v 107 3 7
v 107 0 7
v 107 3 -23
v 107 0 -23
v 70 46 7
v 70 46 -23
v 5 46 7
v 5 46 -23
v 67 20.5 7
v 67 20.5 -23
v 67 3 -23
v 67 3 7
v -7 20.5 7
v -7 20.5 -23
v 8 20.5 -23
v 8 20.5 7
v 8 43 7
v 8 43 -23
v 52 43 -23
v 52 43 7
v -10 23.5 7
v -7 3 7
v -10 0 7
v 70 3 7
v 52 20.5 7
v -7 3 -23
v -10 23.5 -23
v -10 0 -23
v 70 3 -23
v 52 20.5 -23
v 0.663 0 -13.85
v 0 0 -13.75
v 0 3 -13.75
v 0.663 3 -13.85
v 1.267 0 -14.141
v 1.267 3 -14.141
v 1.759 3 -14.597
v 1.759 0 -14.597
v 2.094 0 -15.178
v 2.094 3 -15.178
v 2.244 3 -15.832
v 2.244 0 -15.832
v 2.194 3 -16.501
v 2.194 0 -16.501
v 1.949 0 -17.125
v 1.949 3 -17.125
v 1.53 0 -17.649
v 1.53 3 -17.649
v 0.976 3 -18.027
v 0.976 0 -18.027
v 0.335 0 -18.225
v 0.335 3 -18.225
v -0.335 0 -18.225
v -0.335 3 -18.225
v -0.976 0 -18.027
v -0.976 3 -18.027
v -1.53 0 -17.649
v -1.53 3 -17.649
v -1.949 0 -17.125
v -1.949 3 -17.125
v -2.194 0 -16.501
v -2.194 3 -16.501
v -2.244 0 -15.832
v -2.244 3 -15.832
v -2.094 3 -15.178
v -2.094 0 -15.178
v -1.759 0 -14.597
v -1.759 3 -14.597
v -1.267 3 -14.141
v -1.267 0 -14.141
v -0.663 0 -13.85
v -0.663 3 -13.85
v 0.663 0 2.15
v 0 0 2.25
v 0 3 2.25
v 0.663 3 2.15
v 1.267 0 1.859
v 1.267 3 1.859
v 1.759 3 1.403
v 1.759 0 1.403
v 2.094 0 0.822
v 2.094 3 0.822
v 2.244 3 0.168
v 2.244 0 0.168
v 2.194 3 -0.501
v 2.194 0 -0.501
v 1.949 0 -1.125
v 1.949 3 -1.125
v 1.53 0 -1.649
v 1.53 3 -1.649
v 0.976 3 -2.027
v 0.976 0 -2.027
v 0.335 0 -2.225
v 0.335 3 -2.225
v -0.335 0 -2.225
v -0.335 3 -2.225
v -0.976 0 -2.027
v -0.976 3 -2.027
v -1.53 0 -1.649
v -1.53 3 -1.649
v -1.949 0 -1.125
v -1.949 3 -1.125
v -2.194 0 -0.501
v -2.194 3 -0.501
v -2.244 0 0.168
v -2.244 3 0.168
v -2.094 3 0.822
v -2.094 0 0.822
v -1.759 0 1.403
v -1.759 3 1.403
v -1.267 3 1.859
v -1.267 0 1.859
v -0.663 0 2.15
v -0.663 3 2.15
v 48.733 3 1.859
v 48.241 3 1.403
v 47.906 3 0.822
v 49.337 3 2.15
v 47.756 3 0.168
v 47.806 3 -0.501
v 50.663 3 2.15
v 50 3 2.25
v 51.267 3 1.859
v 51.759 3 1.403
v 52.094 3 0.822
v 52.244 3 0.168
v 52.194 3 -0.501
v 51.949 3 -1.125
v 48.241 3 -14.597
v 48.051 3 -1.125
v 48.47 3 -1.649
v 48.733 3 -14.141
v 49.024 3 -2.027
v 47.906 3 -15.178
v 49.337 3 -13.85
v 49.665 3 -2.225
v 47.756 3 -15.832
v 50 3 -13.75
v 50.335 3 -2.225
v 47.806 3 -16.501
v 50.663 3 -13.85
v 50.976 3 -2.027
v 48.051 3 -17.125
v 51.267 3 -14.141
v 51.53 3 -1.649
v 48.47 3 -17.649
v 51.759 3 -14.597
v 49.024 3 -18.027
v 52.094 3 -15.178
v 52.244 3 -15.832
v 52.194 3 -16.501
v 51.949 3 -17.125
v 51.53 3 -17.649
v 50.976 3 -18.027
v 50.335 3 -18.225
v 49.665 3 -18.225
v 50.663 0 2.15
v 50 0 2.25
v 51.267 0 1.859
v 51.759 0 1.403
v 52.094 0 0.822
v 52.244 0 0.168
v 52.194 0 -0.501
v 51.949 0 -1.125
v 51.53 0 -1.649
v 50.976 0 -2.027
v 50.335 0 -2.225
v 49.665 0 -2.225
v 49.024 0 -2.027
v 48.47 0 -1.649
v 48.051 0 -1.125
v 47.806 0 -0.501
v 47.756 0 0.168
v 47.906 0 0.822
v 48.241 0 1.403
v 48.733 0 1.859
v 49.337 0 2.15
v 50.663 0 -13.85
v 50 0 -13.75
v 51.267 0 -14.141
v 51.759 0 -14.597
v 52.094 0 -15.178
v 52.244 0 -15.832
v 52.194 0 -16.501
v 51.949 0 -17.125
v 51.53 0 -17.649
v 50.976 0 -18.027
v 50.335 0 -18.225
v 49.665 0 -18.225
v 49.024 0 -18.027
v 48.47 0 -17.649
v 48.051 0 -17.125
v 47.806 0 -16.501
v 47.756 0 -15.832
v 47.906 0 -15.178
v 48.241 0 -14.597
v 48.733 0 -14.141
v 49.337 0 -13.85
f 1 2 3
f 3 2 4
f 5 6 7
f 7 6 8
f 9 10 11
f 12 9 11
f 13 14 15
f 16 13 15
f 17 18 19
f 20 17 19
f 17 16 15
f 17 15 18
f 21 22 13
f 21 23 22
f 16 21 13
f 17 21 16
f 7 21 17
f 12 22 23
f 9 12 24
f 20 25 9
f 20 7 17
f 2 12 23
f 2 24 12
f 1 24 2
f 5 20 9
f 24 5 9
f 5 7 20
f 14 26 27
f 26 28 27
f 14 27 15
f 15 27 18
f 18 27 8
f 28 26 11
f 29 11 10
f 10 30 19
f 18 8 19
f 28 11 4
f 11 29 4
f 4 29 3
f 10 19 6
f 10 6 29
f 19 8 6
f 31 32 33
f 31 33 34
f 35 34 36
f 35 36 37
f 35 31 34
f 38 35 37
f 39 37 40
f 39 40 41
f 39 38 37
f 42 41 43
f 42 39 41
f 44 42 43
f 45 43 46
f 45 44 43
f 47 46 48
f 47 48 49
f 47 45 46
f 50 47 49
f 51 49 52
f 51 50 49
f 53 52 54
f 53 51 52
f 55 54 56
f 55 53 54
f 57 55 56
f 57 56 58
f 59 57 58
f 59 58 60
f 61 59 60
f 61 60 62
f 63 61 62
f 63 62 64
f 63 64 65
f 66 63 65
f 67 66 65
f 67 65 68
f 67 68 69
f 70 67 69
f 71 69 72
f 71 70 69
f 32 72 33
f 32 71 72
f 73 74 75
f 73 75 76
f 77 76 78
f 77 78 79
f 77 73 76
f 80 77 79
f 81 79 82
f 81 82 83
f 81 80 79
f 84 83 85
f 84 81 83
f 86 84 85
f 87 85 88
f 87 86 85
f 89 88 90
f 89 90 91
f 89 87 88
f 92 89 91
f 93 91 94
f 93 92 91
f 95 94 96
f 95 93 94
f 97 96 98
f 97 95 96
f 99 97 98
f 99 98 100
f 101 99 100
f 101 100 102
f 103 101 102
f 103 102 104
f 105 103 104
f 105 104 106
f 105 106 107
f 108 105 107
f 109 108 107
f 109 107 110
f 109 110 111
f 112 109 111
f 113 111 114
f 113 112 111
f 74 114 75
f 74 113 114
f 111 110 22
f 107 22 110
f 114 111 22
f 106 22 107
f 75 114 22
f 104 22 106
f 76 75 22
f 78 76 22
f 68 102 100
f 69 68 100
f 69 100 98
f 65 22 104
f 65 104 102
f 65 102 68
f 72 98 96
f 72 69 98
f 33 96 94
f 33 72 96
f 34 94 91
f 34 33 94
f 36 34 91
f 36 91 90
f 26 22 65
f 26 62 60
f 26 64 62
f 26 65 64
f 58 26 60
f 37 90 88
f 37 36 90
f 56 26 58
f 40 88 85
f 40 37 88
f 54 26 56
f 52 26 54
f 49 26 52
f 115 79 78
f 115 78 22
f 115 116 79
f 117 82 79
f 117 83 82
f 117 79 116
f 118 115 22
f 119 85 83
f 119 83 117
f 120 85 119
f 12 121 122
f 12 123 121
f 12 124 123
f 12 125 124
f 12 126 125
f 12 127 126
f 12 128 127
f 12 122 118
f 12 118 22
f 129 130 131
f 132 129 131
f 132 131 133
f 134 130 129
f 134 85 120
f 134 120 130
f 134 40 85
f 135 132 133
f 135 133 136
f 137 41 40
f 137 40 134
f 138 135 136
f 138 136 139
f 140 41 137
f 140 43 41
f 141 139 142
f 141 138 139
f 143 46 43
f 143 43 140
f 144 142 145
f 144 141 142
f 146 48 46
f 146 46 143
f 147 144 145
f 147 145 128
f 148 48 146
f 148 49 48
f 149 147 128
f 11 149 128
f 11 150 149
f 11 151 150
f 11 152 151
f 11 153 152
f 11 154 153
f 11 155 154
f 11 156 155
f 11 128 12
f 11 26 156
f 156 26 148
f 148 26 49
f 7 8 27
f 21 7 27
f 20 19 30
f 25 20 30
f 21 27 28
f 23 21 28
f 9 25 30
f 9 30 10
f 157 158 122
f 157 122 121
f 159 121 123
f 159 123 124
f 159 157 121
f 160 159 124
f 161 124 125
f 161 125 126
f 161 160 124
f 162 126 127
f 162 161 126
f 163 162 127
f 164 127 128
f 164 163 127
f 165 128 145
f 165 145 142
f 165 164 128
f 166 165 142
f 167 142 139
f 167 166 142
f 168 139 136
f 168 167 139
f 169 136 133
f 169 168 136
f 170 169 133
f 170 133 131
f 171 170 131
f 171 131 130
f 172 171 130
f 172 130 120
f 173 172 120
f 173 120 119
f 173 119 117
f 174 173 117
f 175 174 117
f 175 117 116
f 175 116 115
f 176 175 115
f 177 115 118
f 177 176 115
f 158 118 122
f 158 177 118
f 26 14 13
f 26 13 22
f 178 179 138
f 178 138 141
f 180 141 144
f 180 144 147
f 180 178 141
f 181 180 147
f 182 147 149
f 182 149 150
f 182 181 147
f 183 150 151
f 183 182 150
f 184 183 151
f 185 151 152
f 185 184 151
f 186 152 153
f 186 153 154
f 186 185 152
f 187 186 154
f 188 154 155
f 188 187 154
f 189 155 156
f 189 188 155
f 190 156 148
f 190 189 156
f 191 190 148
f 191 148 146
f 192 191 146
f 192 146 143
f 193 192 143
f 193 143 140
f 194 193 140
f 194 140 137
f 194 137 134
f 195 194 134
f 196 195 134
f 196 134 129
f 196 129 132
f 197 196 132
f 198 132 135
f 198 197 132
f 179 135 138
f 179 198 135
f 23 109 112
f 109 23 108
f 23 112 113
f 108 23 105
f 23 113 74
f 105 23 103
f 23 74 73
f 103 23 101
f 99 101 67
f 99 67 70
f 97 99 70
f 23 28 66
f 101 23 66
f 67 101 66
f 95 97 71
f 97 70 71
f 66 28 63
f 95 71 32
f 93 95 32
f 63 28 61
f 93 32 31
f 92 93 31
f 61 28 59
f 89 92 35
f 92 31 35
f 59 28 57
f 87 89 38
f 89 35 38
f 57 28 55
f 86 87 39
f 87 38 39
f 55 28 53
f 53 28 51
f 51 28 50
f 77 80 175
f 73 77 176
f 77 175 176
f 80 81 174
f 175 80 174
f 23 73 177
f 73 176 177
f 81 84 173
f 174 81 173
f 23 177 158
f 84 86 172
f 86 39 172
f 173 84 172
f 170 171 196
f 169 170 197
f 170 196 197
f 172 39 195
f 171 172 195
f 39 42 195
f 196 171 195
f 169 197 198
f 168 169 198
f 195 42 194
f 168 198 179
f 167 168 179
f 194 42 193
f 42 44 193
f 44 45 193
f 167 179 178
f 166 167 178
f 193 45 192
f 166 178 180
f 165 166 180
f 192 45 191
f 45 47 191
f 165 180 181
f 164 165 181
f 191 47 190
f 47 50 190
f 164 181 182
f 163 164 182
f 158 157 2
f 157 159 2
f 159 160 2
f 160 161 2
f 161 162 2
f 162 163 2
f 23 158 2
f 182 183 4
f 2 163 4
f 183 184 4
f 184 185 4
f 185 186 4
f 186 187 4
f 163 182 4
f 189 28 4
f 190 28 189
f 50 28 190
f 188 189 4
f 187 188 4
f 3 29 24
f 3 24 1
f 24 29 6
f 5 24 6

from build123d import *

# Parameters (mm, degrees)
SKETCH1_R           = 2.25
BOSS_EXTRUDE1_DEPTH = 3
BOSS_EXTRUDE2_DEPTH = 30
BOSS_EXTRUDE3_DEPTH = 30


with BuildPart() as part:
    # Sketch1 → Boss-Extrude1 (new body)
    with BuildSketch(Plane(origin=(0, 0, 0), x_dir=(1, 0, 0), z_dir=(0, 1, 0))):
        Polygon((-7, 23), (-7, -7), (57, -7), (107, -7), (107, 23), (57, 23), align=None)
        with Locations(Location((0, 0, 0), (0, 0, 270))):
            Circle(SKETCH1_R, mode=Mode.SUBTRACT)
        with Locations(Location((0, 16, 0), (0, 0, 270))):
            Circle(SKETCH1_R, mode=Mode.SUBTRACT)
        with Locations(Location((50, 0, 0), (0, 0, 270))):
            Circle(SKETCH1_R, mode=Mode.SUBTRACT)
        with Locations(Location((50, 16, 0), (0, 0, 270))):
            Circle(SKETCH1_R, mode=Mode.SUBTRACT)
    extrude(amount=BOSS_EXTRUDE1_DEPTH)

    # Sketch2 → Boss-Extrude2 (add)
    with BuildSketch(Plane(origin=(0, 0, -23), x_dir=(-1, 0, 0), z_dir=(0, 0, -1))):
        Polygon((7, 3), (7, 20.5), (-7.999999932, 20.5), (-7.999999932, 43.000000035), (-51.999999932, 43.000000035), (-51.999999932, 20.5), (-66.999999864, 20.5), (-66.999999864, 3), (-69.999999864, 3), (-69.999999864, 46.000000035), (-4.999999932, 46.000000035), (-4.999999932, 23.5), (10, 23.5), (10, 0), (7, 0), align=None)
    extrude(amount=-BOSS_EXTRUDE2_DEPTH)

    # Sketch3 → Boss-Extrude3 (add)
    with BuildSketch(Plane(origin=(0, 0, -23), x_dir=(-1, 0, 0), z_dir=(0, 0, -1))):
        Polygon((-4.999999932, 46.000000035), (10, 23.5), (-4.999999932, 23.5), align=None)
    extrude(amount=-BOSS_EXTRUDE3_DEPTH)


solid = part.part
